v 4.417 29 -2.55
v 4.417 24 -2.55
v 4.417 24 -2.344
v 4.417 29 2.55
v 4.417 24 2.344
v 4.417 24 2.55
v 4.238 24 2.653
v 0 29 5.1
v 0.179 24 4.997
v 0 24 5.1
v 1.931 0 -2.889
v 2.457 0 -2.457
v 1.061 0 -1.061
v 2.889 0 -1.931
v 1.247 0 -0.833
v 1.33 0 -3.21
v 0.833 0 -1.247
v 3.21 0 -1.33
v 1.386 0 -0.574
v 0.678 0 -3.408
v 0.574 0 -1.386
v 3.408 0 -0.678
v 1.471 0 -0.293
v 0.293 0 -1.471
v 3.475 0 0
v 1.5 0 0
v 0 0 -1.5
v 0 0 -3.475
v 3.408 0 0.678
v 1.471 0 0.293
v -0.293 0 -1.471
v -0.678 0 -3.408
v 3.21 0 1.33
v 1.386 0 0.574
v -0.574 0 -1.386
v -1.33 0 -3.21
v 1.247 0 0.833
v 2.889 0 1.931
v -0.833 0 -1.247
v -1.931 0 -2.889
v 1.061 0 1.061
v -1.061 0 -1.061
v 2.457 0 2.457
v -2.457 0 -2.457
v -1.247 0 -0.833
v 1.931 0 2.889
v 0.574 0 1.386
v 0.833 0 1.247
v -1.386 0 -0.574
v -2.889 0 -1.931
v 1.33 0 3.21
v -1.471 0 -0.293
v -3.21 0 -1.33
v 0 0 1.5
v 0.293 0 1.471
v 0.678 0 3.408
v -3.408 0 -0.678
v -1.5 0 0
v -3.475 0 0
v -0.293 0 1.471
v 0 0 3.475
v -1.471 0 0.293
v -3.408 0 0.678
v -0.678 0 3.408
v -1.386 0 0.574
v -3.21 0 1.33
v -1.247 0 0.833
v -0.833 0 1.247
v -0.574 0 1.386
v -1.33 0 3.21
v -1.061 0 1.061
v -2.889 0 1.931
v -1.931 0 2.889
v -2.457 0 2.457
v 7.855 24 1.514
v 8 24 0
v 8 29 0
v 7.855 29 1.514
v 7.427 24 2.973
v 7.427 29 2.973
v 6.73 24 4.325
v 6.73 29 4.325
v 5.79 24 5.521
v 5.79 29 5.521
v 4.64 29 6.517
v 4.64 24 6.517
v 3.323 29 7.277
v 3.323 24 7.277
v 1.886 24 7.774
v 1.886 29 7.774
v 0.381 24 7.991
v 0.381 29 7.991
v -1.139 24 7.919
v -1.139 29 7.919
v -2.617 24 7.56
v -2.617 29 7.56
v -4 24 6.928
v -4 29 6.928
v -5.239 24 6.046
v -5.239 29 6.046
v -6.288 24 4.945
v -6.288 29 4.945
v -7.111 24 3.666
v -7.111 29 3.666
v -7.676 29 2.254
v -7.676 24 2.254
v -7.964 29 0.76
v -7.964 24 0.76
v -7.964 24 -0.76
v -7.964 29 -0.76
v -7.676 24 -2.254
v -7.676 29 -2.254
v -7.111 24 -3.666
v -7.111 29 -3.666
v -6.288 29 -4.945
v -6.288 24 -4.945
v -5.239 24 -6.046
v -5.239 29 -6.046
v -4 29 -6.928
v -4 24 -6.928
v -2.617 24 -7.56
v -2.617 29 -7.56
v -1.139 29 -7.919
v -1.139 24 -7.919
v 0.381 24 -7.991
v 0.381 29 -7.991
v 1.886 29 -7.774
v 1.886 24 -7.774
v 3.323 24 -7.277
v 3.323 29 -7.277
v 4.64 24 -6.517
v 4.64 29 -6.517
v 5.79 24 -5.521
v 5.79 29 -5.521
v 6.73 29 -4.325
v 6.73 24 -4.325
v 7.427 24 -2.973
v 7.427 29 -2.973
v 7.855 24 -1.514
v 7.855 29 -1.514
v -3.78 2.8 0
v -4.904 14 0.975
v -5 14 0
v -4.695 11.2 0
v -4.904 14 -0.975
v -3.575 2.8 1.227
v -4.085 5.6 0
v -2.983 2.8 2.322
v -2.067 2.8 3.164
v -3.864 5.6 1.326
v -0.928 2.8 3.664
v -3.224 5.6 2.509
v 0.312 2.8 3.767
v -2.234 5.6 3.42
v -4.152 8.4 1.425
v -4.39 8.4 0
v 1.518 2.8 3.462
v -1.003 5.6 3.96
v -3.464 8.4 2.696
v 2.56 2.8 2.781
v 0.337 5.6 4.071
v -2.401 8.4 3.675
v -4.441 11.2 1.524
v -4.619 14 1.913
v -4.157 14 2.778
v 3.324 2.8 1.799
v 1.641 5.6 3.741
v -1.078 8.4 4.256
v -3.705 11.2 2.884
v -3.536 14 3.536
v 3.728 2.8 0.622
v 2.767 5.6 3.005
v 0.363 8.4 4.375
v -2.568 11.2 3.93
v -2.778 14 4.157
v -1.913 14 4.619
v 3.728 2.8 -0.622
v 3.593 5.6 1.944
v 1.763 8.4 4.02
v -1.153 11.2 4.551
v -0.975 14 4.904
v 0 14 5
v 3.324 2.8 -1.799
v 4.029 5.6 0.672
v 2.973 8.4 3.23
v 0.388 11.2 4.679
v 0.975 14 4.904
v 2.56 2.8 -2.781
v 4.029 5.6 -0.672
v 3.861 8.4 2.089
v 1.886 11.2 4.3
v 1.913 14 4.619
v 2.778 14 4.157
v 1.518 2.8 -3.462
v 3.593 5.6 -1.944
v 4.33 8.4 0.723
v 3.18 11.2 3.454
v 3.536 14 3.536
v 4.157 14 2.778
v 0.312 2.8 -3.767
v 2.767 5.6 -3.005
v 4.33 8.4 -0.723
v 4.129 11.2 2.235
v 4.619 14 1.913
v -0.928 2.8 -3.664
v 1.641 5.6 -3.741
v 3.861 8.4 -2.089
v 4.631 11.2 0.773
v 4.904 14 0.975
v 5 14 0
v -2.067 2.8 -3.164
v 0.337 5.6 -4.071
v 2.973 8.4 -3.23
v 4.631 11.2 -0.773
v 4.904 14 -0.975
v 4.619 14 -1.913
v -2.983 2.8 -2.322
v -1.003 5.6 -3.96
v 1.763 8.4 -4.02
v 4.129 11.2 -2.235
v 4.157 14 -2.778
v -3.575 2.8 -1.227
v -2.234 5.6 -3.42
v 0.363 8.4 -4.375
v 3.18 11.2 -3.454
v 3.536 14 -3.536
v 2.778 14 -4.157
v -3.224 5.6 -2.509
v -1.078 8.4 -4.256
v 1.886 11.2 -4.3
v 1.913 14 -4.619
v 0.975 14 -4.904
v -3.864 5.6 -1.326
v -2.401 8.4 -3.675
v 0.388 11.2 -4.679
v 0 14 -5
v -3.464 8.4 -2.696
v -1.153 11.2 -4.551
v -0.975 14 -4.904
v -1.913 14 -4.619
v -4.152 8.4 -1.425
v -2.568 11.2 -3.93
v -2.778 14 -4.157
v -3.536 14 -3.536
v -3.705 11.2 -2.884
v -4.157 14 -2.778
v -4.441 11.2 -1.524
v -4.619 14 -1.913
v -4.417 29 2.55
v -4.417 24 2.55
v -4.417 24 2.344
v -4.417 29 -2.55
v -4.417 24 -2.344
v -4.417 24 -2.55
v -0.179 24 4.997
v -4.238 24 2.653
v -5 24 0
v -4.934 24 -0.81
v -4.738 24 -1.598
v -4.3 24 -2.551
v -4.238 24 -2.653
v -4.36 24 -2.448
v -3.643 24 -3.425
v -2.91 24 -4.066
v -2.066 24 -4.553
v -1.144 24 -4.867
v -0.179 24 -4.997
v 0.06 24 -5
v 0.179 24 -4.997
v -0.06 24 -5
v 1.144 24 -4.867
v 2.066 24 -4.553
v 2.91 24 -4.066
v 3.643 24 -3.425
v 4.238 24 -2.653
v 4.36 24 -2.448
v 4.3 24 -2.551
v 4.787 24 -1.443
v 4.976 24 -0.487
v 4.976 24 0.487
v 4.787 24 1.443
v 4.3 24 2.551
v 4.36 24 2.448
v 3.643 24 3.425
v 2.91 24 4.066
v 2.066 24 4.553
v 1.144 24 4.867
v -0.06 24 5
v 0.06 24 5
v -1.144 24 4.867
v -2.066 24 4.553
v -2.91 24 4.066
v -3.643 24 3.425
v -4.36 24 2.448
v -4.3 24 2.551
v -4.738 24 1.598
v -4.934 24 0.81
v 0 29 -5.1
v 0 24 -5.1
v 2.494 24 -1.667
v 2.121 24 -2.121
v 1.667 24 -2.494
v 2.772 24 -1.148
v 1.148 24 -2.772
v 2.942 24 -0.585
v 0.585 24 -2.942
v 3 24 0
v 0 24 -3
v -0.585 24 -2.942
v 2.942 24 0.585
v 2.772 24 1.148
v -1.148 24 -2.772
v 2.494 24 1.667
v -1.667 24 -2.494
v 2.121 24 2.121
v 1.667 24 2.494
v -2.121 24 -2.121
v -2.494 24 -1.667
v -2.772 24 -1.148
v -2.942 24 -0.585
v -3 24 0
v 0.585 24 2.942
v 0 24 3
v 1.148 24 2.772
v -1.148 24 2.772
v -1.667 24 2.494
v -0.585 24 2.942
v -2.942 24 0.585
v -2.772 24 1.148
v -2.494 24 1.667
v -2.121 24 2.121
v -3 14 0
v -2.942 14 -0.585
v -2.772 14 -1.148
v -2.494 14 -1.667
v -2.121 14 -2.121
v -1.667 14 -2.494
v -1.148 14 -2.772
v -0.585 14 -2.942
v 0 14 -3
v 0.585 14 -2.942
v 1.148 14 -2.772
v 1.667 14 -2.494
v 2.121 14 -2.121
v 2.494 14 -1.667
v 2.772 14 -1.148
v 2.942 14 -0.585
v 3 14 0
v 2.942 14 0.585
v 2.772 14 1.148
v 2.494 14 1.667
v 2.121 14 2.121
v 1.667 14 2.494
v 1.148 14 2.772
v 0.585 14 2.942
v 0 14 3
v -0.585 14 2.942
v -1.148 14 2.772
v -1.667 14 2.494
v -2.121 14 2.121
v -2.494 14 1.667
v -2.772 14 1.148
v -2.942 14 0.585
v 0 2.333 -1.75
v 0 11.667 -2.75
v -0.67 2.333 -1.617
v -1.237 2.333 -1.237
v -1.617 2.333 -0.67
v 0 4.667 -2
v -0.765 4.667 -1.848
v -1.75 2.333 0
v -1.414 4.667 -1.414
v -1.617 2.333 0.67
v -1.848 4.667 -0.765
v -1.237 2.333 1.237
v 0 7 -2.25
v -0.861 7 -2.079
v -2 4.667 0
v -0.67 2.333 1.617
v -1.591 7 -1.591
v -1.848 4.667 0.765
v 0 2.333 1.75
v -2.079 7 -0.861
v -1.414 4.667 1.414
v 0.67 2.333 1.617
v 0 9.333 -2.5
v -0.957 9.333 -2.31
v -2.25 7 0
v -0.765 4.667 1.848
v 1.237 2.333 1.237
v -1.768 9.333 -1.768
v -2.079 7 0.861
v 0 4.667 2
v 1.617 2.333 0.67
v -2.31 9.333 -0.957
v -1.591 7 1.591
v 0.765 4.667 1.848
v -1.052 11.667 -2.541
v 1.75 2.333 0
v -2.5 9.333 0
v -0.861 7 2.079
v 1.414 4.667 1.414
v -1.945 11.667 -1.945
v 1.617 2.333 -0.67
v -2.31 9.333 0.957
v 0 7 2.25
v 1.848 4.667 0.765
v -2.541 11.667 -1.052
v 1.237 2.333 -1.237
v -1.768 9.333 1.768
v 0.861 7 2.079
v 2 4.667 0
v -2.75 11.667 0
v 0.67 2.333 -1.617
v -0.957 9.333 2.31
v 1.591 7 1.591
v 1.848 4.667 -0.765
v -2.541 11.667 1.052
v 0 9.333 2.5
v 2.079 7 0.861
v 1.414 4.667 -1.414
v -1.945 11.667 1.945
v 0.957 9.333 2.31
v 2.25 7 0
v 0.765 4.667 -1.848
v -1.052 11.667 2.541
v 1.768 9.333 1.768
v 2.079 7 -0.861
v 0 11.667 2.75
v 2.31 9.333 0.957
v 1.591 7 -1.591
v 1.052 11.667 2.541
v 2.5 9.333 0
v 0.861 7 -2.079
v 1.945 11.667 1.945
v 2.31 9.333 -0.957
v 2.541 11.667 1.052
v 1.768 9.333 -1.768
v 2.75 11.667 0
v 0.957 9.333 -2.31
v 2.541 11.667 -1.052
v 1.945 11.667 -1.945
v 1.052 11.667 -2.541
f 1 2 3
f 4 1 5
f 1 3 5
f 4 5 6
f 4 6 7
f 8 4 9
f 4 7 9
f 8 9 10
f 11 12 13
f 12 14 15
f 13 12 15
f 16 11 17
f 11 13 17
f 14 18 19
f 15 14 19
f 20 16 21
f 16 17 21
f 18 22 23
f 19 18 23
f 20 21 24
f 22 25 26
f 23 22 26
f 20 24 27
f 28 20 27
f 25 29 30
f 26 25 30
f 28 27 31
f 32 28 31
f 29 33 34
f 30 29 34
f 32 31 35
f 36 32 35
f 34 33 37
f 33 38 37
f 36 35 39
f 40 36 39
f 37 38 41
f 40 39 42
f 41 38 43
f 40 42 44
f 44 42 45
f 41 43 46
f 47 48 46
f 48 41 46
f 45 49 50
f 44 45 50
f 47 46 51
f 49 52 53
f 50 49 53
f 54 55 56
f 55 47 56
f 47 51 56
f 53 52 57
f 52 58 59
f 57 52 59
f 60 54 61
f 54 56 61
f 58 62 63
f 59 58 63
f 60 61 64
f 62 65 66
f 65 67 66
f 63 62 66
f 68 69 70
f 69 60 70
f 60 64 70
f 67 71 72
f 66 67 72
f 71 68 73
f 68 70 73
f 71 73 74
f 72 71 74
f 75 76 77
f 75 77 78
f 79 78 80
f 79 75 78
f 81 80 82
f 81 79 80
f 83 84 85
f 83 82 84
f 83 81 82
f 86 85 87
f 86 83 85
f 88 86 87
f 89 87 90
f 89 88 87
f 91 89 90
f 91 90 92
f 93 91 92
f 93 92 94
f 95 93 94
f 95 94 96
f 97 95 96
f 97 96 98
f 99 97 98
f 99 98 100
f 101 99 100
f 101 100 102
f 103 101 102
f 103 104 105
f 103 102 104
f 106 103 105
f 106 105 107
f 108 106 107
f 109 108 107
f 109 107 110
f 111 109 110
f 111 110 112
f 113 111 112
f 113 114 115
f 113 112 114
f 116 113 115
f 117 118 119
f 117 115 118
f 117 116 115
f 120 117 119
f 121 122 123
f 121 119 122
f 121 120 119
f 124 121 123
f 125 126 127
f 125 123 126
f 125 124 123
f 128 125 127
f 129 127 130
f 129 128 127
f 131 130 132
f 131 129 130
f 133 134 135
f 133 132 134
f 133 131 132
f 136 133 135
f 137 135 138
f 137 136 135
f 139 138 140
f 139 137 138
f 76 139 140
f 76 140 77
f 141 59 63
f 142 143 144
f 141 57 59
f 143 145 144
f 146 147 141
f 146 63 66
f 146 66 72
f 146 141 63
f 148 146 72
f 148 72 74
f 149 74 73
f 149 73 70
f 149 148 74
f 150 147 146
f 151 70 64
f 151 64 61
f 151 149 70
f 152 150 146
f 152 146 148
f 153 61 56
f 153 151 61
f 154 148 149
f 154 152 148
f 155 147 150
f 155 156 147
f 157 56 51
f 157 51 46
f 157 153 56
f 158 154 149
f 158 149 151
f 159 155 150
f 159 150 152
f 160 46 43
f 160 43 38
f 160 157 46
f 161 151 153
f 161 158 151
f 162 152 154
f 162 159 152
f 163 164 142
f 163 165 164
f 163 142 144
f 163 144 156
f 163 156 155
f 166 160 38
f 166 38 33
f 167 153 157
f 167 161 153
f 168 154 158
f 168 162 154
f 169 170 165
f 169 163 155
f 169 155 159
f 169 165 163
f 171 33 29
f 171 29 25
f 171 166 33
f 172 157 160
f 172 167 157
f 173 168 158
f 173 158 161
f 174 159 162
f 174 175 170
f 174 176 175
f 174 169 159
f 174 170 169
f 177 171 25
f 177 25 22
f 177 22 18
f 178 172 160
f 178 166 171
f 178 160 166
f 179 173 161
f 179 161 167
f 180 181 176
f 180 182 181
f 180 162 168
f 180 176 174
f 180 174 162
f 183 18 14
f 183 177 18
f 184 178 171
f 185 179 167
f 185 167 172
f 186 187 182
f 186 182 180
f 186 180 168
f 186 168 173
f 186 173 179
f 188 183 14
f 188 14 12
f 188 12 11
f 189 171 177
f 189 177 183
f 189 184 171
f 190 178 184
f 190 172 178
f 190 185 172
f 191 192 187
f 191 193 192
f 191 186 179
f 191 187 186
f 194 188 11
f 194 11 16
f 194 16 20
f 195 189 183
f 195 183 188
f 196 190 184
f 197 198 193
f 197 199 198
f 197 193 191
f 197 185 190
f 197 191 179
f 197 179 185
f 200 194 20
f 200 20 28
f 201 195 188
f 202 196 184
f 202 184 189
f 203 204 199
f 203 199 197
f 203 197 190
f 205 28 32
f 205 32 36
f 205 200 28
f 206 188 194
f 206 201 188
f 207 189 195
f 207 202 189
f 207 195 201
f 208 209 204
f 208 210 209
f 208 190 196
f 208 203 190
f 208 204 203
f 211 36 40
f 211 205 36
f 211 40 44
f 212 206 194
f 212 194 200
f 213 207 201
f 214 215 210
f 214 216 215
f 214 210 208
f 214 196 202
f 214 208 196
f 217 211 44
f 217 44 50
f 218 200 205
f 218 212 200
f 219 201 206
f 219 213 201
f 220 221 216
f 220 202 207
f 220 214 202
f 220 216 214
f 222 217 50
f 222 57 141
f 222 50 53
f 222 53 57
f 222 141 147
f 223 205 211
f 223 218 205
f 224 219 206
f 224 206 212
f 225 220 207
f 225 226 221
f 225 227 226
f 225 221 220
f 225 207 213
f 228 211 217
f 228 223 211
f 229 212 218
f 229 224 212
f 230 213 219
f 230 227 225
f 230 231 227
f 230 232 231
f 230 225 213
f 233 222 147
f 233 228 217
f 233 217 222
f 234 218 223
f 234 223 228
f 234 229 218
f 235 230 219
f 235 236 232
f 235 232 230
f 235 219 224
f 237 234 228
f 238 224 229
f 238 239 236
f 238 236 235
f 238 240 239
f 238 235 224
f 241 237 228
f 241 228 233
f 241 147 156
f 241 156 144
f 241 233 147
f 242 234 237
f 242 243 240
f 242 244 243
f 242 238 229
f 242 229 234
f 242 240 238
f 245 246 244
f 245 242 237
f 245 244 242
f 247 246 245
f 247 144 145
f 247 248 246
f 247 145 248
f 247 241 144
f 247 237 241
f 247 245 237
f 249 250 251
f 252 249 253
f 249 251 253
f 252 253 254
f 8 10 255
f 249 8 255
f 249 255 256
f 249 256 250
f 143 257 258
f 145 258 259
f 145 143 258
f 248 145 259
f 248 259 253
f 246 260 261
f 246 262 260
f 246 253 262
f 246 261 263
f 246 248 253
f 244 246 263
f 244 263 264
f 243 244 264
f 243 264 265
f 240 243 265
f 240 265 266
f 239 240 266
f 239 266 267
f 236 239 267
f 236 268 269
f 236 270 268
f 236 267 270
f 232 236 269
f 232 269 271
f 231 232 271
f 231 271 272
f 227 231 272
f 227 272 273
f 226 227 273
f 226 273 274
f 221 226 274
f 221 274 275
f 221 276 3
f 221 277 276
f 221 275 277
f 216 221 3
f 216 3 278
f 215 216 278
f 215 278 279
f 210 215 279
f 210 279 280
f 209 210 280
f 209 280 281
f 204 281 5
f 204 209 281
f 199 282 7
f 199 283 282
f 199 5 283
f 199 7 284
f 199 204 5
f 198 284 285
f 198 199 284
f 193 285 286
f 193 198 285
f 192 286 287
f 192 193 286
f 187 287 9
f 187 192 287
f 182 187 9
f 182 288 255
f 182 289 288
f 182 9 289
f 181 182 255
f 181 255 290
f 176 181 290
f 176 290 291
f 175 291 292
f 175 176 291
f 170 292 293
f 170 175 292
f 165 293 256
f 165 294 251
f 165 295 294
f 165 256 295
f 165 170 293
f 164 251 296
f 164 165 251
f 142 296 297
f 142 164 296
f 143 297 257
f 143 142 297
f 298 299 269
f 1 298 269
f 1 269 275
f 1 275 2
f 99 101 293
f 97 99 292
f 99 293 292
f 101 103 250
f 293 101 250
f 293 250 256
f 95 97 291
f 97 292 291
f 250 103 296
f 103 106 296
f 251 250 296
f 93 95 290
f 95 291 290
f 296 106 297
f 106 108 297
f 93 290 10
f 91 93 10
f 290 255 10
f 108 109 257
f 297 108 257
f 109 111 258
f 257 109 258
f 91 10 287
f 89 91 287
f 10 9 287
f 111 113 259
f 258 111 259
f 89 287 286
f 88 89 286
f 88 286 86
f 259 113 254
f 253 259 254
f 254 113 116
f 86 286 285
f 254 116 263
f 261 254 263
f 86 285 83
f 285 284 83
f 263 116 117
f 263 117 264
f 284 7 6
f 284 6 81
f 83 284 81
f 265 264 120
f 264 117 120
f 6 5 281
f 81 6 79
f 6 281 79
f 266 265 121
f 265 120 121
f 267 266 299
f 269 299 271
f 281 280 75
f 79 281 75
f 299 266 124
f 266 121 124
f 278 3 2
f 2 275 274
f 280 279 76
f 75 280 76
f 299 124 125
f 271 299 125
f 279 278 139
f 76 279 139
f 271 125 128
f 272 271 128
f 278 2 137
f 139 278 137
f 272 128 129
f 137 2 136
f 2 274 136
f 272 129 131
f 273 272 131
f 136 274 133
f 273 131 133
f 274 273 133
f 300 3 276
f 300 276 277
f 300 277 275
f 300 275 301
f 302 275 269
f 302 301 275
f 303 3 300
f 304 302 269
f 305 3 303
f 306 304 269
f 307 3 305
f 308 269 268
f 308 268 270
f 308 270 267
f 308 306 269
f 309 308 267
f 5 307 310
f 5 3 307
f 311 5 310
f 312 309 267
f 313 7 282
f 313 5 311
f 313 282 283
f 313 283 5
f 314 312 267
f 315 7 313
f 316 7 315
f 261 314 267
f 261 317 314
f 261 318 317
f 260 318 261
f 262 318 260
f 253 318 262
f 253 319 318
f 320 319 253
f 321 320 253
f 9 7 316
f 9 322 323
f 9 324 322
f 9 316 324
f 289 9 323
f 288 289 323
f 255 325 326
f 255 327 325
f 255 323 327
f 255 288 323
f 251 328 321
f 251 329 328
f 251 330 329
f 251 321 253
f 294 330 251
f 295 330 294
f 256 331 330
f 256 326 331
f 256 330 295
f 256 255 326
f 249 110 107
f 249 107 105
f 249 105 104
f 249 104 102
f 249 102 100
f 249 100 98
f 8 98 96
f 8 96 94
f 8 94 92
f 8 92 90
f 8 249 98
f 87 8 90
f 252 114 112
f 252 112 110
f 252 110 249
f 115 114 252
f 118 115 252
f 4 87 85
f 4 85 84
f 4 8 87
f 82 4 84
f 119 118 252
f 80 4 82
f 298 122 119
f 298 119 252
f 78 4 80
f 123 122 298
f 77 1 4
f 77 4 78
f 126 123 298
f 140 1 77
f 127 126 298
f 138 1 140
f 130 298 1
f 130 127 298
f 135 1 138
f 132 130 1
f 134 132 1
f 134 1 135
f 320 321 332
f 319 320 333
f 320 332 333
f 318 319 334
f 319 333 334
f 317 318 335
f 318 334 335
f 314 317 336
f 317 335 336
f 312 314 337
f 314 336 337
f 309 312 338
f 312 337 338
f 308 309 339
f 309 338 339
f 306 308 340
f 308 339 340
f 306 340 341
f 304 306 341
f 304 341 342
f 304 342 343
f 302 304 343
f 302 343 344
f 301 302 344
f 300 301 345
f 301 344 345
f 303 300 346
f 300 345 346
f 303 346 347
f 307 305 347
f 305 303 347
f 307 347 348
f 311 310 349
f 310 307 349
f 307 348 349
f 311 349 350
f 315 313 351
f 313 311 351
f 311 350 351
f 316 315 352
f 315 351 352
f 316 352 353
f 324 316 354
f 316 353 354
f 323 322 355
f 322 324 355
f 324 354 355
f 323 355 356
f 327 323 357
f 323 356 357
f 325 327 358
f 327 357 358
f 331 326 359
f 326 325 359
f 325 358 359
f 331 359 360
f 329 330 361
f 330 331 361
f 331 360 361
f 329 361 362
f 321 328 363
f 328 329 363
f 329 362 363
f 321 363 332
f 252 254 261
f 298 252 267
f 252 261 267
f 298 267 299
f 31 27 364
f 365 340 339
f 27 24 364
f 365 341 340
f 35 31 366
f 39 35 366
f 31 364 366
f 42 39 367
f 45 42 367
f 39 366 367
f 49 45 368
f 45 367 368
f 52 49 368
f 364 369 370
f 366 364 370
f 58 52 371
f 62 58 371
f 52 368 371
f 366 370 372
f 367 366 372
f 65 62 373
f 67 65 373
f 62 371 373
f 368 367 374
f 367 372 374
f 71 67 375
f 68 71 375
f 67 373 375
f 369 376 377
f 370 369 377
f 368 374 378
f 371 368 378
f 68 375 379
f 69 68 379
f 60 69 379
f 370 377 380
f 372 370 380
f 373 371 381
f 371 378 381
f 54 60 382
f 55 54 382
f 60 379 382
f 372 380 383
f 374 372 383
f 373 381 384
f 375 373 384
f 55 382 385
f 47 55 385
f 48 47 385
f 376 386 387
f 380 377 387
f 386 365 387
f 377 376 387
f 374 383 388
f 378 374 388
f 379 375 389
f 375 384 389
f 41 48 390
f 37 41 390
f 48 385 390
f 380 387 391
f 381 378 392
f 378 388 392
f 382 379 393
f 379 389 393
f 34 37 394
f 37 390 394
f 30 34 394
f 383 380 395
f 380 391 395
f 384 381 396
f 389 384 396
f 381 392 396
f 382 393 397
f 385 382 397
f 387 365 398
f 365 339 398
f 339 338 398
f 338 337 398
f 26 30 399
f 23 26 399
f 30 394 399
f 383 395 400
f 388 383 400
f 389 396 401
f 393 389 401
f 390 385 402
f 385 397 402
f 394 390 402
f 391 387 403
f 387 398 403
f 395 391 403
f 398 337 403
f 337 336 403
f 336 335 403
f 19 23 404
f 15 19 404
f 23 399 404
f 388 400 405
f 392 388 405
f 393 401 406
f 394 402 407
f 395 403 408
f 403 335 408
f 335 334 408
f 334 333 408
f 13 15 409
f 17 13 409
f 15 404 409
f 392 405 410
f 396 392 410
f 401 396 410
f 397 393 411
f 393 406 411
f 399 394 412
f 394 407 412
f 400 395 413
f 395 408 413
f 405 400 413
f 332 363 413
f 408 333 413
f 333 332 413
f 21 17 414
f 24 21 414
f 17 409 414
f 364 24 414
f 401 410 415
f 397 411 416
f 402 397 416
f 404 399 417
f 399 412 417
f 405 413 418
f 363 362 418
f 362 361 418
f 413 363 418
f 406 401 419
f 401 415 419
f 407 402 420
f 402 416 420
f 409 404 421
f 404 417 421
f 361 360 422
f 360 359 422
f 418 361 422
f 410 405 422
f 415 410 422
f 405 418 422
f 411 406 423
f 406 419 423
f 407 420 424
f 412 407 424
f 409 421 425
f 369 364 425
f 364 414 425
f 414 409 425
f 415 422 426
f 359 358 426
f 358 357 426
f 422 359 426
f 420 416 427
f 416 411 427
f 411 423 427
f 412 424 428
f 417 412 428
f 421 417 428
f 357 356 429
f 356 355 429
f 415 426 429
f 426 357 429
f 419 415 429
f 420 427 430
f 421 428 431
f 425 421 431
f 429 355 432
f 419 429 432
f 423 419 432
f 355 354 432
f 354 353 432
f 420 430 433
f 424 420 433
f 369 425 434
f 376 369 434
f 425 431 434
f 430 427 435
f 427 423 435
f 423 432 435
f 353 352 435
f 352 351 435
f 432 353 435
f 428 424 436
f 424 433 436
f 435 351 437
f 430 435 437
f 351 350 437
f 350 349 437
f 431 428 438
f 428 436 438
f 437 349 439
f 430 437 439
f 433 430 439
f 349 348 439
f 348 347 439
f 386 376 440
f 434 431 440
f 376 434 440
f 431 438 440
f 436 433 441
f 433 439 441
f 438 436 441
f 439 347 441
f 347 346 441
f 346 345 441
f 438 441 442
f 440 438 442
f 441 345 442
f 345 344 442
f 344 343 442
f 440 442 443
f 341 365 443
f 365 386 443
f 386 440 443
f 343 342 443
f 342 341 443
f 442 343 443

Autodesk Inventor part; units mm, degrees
ref_plane "YZ Plane" through (0, 0, 0) normal (1, 0, 0) x (0, 1, 0)
ref_plane "XY Plane" through (0, 0, 0) normal (0, 0, 1) x (1, 0, 0)
sketch "Sketch1" plane through (0, 0, 0) normal (0, 1, 0) x (-1, 0, 0)
  circle A0 centre (0, 0) radius 3.475
  circle A1 centre (0, 0) radius 1.5
  dimension "d0" = 6.95
  dimension "d11" = 3
ref_plane "Work Plane1" through (0, 14, 0) normal (0, 1, 0) x (-1, 0, 0)
sketch "Sketch2" plane through (0, 14, 0) normal (0, 1, 0) x (-1, 0, 0)
  circle A0 centre (0, 0) radius 5
  circle A1 centre (0, 0) radius 3
  dimension "d6" = 10
  dimension "d12" = 6
loft "Loft1" add profiles "Sketch1", "Sketch2" contours A0 | A1 / A0 | A1
extrude "Extrusion2" add sketch "Sketch2" along normal blind 10
hole "Hole3" at (0, 0, 0) direction (0, 1, 0) diameter 3 end through all
loft "Loft2" cut section 1 edges at (0, 0, 1.5) section 2 edges at (3, 14, 0)
sketch "Sketch3" plane through (0, 24, 0) normal (0, 1, 0) x (1, 0, 0)
  circle A0 centre (0, 0) radius 3
  circle A1 centre (0, 0) radius 5.1
  circle A2 centre (0, 0) radius 1.5 projected
  line L0 (0, 5.1) -> (4.4167, 2.55)
  line L1 (4.4167, 2.55) -> (4.4167, -2.55)
  line L2 (4.4167, -2.55) -> (0, -5.1)
  line L3 (0, -5.1) -> (-4.4167, -2.55)
  line L4 (-4.4167, -2.55) -> (-4.4167, 2.55)
  line L5 (-4.4167, 2.55) -> (0, 5.1)
  circle A3 centre (0, 0) radius 8
  dimension "d43" = 10.2
  dimension "d42" = 6
  dimension "d44" = 16
extrude "Extrusion3" add sketch "Sketch3" along normal blind 5 contours A1 L1 | L0 A1 | A1 L2 | L5 A1 | A1 L3 | L4 A1 | A3
properties part number "vacuum-nozzle-shaft"
